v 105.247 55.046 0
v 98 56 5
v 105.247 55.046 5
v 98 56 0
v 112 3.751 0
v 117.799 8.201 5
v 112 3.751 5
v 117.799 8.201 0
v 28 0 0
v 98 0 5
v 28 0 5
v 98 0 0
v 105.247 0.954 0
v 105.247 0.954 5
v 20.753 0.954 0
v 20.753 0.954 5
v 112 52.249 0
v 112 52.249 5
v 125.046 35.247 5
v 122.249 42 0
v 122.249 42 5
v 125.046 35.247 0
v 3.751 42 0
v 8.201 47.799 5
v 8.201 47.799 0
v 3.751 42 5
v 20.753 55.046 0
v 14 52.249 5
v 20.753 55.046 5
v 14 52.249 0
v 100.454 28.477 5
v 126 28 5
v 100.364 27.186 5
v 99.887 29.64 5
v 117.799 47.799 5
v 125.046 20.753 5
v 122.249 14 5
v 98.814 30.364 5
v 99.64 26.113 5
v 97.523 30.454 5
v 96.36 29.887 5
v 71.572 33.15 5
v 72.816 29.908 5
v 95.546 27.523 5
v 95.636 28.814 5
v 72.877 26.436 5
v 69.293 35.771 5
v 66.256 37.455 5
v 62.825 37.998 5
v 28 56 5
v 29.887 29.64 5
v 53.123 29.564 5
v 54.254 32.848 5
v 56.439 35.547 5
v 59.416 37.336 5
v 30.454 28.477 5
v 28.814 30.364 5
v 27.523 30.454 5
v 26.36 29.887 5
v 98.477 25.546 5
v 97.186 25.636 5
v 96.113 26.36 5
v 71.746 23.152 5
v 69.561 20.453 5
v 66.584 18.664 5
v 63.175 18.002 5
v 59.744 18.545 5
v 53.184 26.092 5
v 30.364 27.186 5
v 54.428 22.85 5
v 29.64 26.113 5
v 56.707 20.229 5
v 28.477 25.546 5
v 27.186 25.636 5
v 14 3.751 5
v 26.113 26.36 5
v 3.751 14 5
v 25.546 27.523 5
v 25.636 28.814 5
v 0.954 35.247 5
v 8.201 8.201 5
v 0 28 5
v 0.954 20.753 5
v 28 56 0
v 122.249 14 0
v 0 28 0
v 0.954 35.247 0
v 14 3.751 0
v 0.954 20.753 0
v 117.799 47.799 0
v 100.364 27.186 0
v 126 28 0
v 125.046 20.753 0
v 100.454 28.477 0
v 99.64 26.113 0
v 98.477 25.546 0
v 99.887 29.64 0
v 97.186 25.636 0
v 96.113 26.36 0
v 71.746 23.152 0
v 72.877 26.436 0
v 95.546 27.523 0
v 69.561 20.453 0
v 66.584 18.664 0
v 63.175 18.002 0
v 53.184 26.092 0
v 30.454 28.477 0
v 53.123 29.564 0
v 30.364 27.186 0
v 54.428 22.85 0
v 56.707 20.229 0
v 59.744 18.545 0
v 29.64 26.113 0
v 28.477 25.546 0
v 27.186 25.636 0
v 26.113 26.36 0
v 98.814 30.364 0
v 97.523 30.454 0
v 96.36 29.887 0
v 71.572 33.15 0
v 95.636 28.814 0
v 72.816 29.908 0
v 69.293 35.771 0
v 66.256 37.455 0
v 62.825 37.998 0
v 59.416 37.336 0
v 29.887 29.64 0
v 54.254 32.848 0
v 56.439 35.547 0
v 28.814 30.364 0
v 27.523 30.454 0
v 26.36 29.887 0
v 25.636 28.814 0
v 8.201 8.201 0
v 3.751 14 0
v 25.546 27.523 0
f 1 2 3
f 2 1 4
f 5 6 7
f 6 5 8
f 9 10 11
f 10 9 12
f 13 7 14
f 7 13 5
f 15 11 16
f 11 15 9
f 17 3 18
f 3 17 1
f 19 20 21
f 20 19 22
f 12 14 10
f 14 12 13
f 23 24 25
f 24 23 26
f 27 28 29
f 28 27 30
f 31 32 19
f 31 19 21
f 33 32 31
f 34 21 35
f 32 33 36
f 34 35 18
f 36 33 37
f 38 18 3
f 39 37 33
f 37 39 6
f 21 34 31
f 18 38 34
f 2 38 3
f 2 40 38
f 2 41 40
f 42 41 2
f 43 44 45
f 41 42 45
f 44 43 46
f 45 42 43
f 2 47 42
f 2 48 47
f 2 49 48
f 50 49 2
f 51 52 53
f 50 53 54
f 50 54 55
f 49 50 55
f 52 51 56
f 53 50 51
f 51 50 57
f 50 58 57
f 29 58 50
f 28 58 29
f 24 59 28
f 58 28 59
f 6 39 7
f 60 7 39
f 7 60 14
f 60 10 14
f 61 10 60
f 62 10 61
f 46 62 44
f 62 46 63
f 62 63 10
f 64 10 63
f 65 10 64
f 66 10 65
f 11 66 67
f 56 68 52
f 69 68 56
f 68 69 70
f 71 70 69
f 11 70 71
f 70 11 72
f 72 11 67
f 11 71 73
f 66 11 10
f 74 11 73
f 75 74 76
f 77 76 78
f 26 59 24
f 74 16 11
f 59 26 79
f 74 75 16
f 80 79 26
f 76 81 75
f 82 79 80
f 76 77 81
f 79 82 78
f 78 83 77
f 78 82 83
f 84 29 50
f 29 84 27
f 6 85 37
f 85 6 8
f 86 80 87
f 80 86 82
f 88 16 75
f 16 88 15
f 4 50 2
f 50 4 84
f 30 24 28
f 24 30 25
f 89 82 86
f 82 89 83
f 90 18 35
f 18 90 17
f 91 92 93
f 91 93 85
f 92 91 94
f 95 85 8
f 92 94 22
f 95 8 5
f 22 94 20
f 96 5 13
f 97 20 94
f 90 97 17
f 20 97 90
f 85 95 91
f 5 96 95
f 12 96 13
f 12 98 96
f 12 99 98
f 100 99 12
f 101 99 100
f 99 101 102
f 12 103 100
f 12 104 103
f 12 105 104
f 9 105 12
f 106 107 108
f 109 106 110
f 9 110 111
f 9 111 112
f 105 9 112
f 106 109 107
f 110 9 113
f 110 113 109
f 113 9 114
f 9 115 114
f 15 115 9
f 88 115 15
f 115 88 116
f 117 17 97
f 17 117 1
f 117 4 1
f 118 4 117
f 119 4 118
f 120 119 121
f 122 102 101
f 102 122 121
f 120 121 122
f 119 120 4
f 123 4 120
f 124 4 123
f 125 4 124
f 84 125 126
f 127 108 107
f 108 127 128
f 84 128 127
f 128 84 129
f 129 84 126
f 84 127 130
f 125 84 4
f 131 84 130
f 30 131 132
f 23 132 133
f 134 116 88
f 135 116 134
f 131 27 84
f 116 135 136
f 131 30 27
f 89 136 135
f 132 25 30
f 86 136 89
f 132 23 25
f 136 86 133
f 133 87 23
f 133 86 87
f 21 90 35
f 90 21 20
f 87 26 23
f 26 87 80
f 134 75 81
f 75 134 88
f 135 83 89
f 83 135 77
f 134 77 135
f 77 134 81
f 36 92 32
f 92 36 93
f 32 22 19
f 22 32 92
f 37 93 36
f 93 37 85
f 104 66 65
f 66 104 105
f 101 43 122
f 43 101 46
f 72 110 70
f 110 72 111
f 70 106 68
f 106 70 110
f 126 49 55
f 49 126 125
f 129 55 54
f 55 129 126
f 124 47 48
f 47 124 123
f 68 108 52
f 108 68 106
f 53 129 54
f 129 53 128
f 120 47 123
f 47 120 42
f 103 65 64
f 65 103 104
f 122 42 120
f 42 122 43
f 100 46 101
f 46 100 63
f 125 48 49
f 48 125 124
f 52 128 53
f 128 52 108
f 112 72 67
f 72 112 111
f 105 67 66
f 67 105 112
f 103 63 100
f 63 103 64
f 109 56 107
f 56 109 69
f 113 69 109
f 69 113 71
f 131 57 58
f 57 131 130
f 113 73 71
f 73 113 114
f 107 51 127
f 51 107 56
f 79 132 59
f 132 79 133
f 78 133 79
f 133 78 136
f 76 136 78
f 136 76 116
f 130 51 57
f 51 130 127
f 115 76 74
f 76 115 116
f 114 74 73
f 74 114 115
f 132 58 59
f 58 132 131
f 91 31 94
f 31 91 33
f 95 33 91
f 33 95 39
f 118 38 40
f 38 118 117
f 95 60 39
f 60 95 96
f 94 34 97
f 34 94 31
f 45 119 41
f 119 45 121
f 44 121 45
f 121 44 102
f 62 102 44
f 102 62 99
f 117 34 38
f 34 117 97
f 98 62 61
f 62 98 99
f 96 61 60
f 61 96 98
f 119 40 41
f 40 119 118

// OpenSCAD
$fn = 32;

// ----------------------------------------------------------------------
// Spacer plate: obround span 70, caps R28
// ----------------------------------------------------------------------

// --- parameters (mm) ---
bore_r = 10;              // centre bore radius
bolt_r = 2.5;             // bolt hole radius
plate_t = 5;              // plate thickness, Z (extrusion height)
span = 70;                // obround span
cap_r = 28;               // cap radius

profile = [[28, 56], [20.753, 55.046], [14, 52.249], [8.201, 47.799], [3.751, 42], [0.954, 35.247], [0, 28], [0.954, 20.753], [3.751, 14], [8.201, 8.201], [14, 3.751], [20.753, 0.954], [28, 0], [98, 0], [105.247, 0.954], [112, 3.751], [117.799, 8.201], [122.249, 14], [125.046, 20.753], [126, 28], [125.046, 35.247], [122.249, 42], [117.799, 47.799], [112, 52.249], [105.247, 55.046], [98, 56]];  // primary outline, 26 points, counter clockwise
void_1 = [[72.816, 29.908], [71.572, 33.15], [69.293, 35.771], [66.256, 37.455], [62.825, 37.998], [59.416, 37.336], [56.439, 35.547], [54.254, 32.848], [53.123, 29.564], [53.184, 26.092], [54.428, 22.85], [56.707, 20.229], [59.744, 18.545], [63.175, 18.002], [66.584, 18.664], [69.561, 20.453], [71.746, 23.152], [72.877, 26.436]];  // centre bore, 18 points
void_2 = [[30.454, 28.477], [29.887, 29.64], [28.814, 30.364], [27.523, 30.454], [26.36, 29.887], [25.636, 28.814], [25.546, 27.523], [26.113, 26.36], [27.186, 25.636], [28.477, 25.546], [29.64, 26.113], [30.364, 27.186]];  // end hole, 12 points
void_3 = [[100.454, 28.477], [99.887, 29.64], [98.814, 30.364], [97.523, 30.454], [96.36, 29.887], [95.636, 28.814], [95.546, 27.523], [96.113, 26.36], [97.186, 25.636], [98.477, 25.546], [99.64, 26.113], [100.364, 27.186]];  // end hole, 12 points

// --- the one profile operation ---
difference() {
  linear_extrude(height = plate_t) polygon(points = profile);
  translate([0, 0, -1])
    linear_extrude(height = plate_t + 2) polygon(points = void_1);
  translate([0, 0, -1])
    linear_extrude(height = plate_t + 2) polygon(points = void_2);
  translate([0, 0, -1])
    linear_extrude(height = plate_t + 2) polygon(points = void_3);
}
